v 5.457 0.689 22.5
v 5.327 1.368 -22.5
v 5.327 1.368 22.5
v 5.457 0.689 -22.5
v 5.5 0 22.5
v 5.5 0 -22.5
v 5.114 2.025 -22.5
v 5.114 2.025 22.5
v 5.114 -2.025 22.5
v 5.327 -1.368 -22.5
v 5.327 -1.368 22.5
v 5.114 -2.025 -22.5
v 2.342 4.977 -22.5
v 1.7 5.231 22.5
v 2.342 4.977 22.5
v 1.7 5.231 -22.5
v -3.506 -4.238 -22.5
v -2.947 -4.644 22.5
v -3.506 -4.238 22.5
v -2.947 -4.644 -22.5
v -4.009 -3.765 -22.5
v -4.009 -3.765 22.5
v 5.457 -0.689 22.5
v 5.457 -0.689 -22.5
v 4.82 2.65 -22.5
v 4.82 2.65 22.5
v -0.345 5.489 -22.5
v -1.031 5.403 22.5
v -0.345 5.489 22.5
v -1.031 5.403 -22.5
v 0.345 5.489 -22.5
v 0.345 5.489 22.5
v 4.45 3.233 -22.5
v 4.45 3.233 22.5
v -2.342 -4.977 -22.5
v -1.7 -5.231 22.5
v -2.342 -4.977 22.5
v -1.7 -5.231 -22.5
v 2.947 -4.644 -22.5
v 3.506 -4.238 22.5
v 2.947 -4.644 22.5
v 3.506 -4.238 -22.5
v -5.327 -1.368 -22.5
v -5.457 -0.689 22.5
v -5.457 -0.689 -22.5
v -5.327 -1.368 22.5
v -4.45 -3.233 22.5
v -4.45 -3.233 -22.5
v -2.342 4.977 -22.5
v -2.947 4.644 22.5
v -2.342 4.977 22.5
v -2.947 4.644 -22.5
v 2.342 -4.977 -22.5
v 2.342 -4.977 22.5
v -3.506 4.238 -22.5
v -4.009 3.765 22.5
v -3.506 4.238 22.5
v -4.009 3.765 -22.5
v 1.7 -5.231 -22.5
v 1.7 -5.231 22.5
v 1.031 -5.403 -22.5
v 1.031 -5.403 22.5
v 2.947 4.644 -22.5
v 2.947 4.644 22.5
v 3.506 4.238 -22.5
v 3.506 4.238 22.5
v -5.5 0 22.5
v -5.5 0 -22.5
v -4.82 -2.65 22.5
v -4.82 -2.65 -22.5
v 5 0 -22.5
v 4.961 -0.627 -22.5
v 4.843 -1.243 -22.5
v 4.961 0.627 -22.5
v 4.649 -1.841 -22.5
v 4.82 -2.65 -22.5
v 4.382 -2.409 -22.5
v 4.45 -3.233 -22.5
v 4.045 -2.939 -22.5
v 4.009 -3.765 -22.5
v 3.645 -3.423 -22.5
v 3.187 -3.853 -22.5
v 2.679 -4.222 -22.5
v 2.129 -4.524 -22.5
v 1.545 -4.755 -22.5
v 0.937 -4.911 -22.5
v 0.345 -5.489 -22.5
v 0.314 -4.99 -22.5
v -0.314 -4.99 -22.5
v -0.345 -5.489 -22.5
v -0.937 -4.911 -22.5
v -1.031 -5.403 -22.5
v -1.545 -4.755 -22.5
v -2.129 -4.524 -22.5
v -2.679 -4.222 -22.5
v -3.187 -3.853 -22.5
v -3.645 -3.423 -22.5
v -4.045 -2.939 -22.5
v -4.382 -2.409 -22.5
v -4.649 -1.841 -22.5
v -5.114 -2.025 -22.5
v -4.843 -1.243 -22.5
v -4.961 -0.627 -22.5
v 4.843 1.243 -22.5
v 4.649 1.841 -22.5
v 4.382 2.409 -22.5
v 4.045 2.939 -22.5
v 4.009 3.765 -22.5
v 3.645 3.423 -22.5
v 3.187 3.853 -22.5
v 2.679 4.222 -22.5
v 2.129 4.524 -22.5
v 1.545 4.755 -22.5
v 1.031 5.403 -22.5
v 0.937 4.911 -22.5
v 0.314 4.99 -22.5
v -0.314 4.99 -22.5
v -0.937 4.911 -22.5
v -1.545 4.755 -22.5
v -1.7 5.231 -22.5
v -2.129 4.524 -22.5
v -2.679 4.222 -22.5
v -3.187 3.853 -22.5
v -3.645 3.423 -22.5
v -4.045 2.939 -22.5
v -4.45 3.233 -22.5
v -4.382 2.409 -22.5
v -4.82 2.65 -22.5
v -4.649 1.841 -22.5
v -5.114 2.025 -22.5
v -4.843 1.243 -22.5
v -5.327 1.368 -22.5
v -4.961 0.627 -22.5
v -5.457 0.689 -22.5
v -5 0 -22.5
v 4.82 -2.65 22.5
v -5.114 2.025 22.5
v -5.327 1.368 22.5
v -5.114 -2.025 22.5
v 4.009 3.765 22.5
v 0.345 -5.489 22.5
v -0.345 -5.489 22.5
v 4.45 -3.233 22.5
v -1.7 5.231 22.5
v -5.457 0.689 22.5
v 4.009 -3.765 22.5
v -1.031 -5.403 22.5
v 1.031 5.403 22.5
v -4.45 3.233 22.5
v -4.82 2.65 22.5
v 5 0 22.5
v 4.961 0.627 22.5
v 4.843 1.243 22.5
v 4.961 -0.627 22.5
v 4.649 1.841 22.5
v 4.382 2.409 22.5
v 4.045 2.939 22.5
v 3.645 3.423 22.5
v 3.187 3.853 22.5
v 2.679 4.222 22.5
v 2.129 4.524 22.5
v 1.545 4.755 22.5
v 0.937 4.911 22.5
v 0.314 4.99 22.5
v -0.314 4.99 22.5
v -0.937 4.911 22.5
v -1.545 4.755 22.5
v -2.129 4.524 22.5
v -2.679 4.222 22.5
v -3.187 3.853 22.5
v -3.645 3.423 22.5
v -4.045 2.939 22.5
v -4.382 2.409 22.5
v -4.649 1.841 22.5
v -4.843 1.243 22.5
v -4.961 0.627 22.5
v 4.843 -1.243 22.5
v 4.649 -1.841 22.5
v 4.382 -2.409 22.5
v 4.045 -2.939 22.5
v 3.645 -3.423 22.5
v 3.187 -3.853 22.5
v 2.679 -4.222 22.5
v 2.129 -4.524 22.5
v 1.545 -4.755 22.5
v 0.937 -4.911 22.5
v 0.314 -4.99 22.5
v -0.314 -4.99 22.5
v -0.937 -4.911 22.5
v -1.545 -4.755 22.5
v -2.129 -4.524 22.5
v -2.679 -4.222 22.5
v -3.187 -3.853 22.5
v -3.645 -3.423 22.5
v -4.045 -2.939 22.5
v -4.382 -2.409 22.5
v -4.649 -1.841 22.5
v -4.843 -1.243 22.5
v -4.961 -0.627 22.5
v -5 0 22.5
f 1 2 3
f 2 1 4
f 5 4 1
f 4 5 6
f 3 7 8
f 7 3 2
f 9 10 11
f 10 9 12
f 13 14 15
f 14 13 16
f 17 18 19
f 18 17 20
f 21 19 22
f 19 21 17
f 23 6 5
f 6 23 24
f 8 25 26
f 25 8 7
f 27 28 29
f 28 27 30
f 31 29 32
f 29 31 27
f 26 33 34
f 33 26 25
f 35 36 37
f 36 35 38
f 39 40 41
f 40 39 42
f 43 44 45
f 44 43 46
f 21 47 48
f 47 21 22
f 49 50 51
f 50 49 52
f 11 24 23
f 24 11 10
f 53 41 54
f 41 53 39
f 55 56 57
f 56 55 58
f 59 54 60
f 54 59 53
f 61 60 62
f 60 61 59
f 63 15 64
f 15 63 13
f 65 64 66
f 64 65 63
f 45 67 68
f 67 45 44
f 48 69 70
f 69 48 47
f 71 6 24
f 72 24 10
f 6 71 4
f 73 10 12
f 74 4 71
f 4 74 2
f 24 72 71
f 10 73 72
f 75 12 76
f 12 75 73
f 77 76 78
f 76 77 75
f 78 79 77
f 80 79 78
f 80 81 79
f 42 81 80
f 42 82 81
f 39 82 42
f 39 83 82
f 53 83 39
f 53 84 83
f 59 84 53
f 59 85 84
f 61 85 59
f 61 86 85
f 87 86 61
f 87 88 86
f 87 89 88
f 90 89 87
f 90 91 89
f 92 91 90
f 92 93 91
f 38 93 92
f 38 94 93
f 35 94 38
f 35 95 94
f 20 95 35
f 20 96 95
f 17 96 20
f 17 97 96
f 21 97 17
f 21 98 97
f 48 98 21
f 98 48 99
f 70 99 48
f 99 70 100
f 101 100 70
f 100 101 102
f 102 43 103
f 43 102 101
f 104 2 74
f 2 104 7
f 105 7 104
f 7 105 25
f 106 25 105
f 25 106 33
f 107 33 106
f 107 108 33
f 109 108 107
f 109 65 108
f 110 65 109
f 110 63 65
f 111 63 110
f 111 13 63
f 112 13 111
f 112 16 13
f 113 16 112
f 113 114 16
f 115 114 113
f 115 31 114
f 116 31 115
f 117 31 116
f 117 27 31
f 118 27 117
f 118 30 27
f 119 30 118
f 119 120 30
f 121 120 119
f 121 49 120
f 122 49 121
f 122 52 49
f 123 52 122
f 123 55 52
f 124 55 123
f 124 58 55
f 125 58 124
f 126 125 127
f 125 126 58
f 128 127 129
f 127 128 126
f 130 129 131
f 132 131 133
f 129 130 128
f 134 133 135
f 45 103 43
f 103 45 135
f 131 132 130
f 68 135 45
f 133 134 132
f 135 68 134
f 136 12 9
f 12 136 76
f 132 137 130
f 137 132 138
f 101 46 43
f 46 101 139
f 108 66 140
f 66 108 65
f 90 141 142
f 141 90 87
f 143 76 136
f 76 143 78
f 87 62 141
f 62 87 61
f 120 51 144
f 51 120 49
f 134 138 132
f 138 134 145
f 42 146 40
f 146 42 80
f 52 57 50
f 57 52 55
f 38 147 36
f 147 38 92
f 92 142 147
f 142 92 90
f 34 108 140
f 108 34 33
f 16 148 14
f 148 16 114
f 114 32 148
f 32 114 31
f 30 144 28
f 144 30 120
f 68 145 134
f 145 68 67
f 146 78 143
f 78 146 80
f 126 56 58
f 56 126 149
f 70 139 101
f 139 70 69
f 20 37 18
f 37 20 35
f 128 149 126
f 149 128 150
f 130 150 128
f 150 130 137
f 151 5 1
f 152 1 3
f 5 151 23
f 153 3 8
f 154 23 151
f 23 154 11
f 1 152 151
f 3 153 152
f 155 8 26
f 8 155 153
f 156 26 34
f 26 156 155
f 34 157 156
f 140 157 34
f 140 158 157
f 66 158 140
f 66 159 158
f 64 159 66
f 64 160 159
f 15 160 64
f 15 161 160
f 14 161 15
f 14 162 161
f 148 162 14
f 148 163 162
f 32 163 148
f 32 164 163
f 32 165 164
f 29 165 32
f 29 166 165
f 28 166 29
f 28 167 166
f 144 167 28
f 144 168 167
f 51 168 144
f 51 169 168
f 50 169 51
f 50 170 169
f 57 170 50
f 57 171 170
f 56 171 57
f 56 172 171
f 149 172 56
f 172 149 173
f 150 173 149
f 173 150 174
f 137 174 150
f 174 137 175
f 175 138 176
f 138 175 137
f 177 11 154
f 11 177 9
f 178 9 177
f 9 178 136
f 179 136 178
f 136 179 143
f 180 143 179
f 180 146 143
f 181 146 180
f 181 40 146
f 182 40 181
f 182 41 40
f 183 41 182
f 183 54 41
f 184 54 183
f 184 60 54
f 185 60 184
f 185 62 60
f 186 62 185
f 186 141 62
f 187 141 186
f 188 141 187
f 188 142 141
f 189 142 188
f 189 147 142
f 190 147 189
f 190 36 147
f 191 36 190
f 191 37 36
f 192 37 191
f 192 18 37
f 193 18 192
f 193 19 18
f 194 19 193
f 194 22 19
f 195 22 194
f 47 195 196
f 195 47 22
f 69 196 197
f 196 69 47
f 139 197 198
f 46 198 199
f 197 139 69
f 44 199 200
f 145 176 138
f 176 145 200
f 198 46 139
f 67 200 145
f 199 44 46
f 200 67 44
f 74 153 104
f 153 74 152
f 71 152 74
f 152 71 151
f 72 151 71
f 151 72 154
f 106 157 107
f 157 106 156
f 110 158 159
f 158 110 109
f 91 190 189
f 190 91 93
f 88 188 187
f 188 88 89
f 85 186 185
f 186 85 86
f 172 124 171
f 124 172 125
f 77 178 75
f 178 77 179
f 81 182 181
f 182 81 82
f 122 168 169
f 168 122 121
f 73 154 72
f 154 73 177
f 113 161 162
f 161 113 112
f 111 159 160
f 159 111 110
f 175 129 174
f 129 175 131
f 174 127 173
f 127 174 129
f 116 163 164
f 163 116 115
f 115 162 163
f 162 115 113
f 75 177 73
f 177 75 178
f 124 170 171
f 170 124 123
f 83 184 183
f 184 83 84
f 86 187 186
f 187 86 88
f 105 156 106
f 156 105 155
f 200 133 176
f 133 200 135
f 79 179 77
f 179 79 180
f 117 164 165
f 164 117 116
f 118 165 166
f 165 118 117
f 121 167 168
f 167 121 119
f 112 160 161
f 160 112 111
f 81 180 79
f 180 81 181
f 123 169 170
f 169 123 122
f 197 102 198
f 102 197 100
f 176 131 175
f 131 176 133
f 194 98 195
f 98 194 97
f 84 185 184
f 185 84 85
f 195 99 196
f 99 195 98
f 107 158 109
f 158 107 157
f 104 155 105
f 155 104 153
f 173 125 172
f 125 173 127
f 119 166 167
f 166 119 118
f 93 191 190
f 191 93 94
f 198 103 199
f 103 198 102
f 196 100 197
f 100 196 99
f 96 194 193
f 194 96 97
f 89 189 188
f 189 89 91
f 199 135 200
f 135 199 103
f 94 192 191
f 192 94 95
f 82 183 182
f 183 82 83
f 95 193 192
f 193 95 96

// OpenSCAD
$fn = 50;


difference() {
	union() {
		translate(v = [0, 0, -22.5000000000]) {
			cylinder(h = 45, r = 5.5000000000);
		}
	}
	union() {
		translate(v = [0, 0, -100.0000000000]) {
			cylinder(h = 200, r = 5.0000000000);
		}
	}
}
